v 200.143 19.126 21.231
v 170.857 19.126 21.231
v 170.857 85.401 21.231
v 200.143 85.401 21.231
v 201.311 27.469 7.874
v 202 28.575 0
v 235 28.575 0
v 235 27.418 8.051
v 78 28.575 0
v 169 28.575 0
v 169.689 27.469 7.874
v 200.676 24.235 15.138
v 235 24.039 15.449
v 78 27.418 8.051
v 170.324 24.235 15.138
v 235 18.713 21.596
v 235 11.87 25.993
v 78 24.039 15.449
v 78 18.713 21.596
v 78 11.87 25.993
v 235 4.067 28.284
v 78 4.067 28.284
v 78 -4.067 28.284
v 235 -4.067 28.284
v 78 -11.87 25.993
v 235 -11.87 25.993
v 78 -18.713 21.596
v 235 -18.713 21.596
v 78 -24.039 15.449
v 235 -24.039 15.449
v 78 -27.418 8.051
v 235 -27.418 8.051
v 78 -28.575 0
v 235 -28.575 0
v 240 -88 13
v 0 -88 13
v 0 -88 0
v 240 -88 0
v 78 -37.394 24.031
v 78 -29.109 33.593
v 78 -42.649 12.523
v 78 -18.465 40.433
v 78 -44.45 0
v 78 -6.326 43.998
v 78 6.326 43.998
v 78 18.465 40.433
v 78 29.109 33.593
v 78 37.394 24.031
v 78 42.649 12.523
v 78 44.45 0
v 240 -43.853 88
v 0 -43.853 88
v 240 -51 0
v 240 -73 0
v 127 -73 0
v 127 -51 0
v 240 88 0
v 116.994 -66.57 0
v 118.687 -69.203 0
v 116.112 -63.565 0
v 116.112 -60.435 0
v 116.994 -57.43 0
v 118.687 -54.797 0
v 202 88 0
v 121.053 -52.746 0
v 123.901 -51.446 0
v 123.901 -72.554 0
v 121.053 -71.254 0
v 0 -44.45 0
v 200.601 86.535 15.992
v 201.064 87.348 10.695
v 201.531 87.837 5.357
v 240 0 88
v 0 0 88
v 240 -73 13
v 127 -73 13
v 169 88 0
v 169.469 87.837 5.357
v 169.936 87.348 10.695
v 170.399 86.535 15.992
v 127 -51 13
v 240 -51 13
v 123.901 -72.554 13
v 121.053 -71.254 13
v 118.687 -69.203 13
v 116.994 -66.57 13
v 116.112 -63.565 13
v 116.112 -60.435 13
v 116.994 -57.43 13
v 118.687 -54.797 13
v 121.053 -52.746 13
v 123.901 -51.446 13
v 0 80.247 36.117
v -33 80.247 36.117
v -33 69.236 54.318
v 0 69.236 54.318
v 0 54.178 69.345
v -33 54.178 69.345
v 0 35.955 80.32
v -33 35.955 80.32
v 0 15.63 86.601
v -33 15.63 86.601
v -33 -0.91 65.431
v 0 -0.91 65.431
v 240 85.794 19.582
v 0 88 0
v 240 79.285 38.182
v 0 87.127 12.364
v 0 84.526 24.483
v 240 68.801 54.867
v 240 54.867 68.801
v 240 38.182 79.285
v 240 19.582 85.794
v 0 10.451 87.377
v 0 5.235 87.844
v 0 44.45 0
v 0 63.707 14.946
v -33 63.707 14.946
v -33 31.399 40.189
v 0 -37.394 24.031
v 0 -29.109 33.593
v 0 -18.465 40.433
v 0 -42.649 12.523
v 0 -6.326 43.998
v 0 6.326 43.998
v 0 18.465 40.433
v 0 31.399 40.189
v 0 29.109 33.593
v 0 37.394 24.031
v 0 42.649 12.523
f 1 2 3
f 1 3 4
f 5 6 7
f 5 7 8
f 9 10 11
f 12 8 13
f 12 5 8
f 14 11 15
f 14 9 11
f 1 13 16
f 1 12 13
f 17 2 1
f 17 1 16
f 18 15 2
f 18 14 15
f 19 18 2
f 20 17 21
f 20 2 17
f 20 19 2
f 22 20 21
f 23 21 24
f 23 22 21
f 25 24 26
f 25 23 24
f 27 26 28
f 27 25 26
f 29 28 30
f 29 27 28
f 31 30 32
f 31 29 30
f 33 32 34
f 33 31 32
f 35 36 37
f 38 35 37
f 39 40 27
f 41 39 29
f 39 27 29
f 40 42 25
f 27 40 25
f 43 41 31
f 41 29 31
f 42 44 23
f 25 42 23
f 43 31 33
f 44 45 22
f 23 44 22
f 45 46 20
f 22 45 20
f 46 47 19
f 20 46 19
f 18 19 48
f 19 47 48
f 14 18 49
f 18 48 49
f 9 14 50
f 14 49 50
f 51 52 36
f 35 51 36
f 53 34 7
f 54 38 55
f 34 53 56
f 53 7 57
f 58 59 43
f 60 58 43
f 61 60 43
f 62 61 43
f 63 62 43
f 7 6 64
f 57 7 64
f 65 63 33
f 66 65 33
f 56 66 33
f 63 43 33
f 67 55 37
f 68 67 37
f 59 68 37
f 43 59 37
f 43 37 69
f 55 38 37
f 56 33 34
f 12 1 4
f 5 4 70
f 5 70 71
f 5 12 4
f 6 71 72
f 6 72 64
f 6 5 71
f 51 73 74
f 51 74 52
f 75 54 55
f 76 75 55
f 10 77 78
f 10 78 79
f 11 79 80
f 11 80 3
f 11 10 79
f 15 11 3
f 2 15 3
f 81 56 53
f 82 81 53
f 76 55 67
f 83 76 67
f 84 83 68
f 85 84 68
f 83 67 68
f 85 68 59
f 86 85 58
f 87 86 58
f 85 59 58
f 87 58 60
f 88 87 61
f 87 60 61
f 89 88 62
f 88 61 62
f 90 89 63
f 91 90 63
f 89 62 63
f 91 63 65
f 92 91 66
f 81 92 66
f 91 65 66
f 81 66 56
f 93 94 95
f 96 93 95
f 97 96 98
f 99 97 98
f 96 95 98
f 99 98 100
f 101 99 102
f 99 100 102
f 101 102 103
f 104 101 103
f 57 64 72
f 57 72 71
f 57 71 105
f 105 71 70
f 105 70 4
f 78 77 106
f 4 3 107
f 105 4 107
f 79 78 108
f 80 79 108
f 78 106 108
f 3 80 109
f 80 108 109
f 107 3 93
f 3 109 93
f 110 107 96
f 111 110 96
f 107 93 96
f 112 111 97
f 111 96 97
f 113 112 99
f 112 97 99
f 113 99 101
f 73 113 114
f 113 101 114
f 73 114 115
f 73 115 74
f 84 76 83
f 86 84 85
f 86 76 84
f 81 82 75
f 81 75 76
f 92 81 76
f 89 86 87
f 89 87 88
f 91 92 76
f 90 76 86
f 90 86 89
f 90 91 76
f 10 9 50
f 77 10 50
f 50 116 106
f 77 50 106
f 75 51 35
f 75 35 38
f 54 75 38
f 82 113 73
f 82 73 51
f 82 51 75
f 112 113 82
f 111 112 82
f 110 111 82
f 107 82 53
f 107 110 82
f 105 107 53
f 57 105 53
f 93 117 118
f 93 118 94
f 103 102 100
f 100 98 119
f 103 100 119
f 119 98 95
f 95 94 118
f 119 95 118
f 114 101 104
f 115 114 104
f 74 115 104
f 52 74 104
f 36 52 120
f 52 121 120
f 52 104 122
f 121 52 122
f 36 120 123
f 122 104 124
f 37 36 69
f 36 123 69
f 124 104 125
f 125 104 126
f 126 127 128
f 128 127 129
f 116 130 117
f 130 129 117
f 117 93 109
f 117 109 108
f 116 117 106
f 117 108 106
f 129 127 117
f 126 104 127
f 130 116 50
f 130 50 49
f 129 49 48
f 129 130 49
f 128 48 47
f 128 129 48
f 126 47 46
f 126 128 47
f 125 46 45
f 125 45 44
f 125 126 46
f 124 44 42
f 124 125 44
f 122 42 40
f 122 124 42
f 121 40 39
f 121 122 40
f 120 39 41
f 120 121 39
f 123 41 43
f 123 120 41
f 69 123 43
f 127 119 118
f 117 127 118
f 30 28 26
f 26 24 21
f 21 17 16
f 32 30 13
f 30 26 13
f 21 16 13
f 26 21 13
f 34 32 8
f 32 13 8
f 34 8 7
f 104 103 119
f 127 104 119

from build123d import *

# Parameters (mm, degrees)
BOSS_EXTRU_1_DEPTH      = 240
ESQUISSE2_R             = 28.575
ENL_V_MAT_EXTRU_1_DEPTH = 235
ESQUISSE3_R             = 44.45
ENL_V_MAT_EXTRU_2_DEPTH = 78
ENL_V_MAT_EXTRU_4_DEPTH = 13
BOSS_EXTRU_2_START      = -33
BOSS_EXTRU_2_DEPTH      = 33
ENL_V_MAT_EXTRU_5_DEPTH = 100


with BuildPart() as part:
    # Esquisse1 → Boss.-Extru.1 (new body)
    with BuildSketch(Plane(origin=(0, 0, 0), x_dir=(0, 0, -1), z_dir=(1, 0, 0))):
        with BuildLine():
            Line((0, 0), (0, 88))
            ThreePointArc((0, 88), (-62.225396744, 62.225396744), (-88, 0))
            Line((-88, 0), (-88, -43.853430349))
            Line((-88, -43.853430349), (-13, -88))
            Line((-13, -88), (0, -88))
            Line((0, -88), (0, 0))
        make_face()
    extrude(amount=BOSS_EXTRU_1_DEPTH)

    # Esquisse2 → Enlèv. mat.-Extru.1 (cut)
    with BuildSketch(Plane(origin=(0, 0, 0), x_dir=(0, 0, -1), z_dir=(1, 0, 0))):
        Circle(ESQUISSE2_R)
    extrude(amount=ENL_V_MAT_EXTRU_1_DEPTH, mode=Mode.SUBTRACT)

    # Esquisse3 → Enlèv. mat.-Extru.2 (cut)
    with BuildSketch(Plane(origin=(0, 0, 0), x_dir=(0, 0, -1), z_dir=(1, 0, 0))):
        Circle(ESQUISSE3_R)
    extrude(amount=ENL_V_MAT_EXTRU_2_DEPTH, mode=Mode.SUBTRACT)

    # Esquisse5 → Enlèv. mat.-Extru.4 (cut)
    with BuildSketch(Plane.XY):
        with BuildLine():
            ThreePointArc((127, -73), (116, -62), (127, -51))
            Line((127, -51), (240, -51))
            Line((240, -51), (240, -73))
            Line((240, -73), (127, -73))
        make_face()
    extrude(amount=ENL_V_MAT_EXTRU_4_DEPTH, mode=Mode.SUBTRACT)

    # Esquisse6 → Boss.-Extru.2 (add)
    with BuildSketch(Plane(origin=(0, 0, 0), x_dir=(0, 0, -1), z_dir=(1, 0, 0)).offset(BOSS_EXTRU_2_START)):
        with BuildLine():
            Line((-65.430668922, -0.909705656), (-40.188548434, 31.398735242))
            Line((-40.188548434, 31.398735242), (-14.946427946, 63.707176139))
            Line((-14.946427946, 63.707176139), (-36.116548227, 80.247086827))
            ThreePointArc((-36.116548227, 80.247086827), (-69.344946317, 54.178209829), (-86.600789204, 15.630205031))
            Line((-86.600789204, 15.630205031), (-65.430668922, -0.909705656))
        make_face()
    extrude(amount=BOSS_EXTRU_2_DEPTH)

    # Esquisse7 → Enlèv. mat.-Extru.5 (cut)
    with BuildSketch(Plane(origin=(0, 0, 0), x_dir=(1, 0, 0), z_dir=(0, 1, 0))):
        Polygon((202, 0), (169, 0), (170.857438953, -21.230624387), (200.142561047, -21.230624387), align=None)
    extrude(amount=ENL_V_MAT_EXTRU_5_DEPTH, mode=Mode.SUBTRACT)


solid = part.part
